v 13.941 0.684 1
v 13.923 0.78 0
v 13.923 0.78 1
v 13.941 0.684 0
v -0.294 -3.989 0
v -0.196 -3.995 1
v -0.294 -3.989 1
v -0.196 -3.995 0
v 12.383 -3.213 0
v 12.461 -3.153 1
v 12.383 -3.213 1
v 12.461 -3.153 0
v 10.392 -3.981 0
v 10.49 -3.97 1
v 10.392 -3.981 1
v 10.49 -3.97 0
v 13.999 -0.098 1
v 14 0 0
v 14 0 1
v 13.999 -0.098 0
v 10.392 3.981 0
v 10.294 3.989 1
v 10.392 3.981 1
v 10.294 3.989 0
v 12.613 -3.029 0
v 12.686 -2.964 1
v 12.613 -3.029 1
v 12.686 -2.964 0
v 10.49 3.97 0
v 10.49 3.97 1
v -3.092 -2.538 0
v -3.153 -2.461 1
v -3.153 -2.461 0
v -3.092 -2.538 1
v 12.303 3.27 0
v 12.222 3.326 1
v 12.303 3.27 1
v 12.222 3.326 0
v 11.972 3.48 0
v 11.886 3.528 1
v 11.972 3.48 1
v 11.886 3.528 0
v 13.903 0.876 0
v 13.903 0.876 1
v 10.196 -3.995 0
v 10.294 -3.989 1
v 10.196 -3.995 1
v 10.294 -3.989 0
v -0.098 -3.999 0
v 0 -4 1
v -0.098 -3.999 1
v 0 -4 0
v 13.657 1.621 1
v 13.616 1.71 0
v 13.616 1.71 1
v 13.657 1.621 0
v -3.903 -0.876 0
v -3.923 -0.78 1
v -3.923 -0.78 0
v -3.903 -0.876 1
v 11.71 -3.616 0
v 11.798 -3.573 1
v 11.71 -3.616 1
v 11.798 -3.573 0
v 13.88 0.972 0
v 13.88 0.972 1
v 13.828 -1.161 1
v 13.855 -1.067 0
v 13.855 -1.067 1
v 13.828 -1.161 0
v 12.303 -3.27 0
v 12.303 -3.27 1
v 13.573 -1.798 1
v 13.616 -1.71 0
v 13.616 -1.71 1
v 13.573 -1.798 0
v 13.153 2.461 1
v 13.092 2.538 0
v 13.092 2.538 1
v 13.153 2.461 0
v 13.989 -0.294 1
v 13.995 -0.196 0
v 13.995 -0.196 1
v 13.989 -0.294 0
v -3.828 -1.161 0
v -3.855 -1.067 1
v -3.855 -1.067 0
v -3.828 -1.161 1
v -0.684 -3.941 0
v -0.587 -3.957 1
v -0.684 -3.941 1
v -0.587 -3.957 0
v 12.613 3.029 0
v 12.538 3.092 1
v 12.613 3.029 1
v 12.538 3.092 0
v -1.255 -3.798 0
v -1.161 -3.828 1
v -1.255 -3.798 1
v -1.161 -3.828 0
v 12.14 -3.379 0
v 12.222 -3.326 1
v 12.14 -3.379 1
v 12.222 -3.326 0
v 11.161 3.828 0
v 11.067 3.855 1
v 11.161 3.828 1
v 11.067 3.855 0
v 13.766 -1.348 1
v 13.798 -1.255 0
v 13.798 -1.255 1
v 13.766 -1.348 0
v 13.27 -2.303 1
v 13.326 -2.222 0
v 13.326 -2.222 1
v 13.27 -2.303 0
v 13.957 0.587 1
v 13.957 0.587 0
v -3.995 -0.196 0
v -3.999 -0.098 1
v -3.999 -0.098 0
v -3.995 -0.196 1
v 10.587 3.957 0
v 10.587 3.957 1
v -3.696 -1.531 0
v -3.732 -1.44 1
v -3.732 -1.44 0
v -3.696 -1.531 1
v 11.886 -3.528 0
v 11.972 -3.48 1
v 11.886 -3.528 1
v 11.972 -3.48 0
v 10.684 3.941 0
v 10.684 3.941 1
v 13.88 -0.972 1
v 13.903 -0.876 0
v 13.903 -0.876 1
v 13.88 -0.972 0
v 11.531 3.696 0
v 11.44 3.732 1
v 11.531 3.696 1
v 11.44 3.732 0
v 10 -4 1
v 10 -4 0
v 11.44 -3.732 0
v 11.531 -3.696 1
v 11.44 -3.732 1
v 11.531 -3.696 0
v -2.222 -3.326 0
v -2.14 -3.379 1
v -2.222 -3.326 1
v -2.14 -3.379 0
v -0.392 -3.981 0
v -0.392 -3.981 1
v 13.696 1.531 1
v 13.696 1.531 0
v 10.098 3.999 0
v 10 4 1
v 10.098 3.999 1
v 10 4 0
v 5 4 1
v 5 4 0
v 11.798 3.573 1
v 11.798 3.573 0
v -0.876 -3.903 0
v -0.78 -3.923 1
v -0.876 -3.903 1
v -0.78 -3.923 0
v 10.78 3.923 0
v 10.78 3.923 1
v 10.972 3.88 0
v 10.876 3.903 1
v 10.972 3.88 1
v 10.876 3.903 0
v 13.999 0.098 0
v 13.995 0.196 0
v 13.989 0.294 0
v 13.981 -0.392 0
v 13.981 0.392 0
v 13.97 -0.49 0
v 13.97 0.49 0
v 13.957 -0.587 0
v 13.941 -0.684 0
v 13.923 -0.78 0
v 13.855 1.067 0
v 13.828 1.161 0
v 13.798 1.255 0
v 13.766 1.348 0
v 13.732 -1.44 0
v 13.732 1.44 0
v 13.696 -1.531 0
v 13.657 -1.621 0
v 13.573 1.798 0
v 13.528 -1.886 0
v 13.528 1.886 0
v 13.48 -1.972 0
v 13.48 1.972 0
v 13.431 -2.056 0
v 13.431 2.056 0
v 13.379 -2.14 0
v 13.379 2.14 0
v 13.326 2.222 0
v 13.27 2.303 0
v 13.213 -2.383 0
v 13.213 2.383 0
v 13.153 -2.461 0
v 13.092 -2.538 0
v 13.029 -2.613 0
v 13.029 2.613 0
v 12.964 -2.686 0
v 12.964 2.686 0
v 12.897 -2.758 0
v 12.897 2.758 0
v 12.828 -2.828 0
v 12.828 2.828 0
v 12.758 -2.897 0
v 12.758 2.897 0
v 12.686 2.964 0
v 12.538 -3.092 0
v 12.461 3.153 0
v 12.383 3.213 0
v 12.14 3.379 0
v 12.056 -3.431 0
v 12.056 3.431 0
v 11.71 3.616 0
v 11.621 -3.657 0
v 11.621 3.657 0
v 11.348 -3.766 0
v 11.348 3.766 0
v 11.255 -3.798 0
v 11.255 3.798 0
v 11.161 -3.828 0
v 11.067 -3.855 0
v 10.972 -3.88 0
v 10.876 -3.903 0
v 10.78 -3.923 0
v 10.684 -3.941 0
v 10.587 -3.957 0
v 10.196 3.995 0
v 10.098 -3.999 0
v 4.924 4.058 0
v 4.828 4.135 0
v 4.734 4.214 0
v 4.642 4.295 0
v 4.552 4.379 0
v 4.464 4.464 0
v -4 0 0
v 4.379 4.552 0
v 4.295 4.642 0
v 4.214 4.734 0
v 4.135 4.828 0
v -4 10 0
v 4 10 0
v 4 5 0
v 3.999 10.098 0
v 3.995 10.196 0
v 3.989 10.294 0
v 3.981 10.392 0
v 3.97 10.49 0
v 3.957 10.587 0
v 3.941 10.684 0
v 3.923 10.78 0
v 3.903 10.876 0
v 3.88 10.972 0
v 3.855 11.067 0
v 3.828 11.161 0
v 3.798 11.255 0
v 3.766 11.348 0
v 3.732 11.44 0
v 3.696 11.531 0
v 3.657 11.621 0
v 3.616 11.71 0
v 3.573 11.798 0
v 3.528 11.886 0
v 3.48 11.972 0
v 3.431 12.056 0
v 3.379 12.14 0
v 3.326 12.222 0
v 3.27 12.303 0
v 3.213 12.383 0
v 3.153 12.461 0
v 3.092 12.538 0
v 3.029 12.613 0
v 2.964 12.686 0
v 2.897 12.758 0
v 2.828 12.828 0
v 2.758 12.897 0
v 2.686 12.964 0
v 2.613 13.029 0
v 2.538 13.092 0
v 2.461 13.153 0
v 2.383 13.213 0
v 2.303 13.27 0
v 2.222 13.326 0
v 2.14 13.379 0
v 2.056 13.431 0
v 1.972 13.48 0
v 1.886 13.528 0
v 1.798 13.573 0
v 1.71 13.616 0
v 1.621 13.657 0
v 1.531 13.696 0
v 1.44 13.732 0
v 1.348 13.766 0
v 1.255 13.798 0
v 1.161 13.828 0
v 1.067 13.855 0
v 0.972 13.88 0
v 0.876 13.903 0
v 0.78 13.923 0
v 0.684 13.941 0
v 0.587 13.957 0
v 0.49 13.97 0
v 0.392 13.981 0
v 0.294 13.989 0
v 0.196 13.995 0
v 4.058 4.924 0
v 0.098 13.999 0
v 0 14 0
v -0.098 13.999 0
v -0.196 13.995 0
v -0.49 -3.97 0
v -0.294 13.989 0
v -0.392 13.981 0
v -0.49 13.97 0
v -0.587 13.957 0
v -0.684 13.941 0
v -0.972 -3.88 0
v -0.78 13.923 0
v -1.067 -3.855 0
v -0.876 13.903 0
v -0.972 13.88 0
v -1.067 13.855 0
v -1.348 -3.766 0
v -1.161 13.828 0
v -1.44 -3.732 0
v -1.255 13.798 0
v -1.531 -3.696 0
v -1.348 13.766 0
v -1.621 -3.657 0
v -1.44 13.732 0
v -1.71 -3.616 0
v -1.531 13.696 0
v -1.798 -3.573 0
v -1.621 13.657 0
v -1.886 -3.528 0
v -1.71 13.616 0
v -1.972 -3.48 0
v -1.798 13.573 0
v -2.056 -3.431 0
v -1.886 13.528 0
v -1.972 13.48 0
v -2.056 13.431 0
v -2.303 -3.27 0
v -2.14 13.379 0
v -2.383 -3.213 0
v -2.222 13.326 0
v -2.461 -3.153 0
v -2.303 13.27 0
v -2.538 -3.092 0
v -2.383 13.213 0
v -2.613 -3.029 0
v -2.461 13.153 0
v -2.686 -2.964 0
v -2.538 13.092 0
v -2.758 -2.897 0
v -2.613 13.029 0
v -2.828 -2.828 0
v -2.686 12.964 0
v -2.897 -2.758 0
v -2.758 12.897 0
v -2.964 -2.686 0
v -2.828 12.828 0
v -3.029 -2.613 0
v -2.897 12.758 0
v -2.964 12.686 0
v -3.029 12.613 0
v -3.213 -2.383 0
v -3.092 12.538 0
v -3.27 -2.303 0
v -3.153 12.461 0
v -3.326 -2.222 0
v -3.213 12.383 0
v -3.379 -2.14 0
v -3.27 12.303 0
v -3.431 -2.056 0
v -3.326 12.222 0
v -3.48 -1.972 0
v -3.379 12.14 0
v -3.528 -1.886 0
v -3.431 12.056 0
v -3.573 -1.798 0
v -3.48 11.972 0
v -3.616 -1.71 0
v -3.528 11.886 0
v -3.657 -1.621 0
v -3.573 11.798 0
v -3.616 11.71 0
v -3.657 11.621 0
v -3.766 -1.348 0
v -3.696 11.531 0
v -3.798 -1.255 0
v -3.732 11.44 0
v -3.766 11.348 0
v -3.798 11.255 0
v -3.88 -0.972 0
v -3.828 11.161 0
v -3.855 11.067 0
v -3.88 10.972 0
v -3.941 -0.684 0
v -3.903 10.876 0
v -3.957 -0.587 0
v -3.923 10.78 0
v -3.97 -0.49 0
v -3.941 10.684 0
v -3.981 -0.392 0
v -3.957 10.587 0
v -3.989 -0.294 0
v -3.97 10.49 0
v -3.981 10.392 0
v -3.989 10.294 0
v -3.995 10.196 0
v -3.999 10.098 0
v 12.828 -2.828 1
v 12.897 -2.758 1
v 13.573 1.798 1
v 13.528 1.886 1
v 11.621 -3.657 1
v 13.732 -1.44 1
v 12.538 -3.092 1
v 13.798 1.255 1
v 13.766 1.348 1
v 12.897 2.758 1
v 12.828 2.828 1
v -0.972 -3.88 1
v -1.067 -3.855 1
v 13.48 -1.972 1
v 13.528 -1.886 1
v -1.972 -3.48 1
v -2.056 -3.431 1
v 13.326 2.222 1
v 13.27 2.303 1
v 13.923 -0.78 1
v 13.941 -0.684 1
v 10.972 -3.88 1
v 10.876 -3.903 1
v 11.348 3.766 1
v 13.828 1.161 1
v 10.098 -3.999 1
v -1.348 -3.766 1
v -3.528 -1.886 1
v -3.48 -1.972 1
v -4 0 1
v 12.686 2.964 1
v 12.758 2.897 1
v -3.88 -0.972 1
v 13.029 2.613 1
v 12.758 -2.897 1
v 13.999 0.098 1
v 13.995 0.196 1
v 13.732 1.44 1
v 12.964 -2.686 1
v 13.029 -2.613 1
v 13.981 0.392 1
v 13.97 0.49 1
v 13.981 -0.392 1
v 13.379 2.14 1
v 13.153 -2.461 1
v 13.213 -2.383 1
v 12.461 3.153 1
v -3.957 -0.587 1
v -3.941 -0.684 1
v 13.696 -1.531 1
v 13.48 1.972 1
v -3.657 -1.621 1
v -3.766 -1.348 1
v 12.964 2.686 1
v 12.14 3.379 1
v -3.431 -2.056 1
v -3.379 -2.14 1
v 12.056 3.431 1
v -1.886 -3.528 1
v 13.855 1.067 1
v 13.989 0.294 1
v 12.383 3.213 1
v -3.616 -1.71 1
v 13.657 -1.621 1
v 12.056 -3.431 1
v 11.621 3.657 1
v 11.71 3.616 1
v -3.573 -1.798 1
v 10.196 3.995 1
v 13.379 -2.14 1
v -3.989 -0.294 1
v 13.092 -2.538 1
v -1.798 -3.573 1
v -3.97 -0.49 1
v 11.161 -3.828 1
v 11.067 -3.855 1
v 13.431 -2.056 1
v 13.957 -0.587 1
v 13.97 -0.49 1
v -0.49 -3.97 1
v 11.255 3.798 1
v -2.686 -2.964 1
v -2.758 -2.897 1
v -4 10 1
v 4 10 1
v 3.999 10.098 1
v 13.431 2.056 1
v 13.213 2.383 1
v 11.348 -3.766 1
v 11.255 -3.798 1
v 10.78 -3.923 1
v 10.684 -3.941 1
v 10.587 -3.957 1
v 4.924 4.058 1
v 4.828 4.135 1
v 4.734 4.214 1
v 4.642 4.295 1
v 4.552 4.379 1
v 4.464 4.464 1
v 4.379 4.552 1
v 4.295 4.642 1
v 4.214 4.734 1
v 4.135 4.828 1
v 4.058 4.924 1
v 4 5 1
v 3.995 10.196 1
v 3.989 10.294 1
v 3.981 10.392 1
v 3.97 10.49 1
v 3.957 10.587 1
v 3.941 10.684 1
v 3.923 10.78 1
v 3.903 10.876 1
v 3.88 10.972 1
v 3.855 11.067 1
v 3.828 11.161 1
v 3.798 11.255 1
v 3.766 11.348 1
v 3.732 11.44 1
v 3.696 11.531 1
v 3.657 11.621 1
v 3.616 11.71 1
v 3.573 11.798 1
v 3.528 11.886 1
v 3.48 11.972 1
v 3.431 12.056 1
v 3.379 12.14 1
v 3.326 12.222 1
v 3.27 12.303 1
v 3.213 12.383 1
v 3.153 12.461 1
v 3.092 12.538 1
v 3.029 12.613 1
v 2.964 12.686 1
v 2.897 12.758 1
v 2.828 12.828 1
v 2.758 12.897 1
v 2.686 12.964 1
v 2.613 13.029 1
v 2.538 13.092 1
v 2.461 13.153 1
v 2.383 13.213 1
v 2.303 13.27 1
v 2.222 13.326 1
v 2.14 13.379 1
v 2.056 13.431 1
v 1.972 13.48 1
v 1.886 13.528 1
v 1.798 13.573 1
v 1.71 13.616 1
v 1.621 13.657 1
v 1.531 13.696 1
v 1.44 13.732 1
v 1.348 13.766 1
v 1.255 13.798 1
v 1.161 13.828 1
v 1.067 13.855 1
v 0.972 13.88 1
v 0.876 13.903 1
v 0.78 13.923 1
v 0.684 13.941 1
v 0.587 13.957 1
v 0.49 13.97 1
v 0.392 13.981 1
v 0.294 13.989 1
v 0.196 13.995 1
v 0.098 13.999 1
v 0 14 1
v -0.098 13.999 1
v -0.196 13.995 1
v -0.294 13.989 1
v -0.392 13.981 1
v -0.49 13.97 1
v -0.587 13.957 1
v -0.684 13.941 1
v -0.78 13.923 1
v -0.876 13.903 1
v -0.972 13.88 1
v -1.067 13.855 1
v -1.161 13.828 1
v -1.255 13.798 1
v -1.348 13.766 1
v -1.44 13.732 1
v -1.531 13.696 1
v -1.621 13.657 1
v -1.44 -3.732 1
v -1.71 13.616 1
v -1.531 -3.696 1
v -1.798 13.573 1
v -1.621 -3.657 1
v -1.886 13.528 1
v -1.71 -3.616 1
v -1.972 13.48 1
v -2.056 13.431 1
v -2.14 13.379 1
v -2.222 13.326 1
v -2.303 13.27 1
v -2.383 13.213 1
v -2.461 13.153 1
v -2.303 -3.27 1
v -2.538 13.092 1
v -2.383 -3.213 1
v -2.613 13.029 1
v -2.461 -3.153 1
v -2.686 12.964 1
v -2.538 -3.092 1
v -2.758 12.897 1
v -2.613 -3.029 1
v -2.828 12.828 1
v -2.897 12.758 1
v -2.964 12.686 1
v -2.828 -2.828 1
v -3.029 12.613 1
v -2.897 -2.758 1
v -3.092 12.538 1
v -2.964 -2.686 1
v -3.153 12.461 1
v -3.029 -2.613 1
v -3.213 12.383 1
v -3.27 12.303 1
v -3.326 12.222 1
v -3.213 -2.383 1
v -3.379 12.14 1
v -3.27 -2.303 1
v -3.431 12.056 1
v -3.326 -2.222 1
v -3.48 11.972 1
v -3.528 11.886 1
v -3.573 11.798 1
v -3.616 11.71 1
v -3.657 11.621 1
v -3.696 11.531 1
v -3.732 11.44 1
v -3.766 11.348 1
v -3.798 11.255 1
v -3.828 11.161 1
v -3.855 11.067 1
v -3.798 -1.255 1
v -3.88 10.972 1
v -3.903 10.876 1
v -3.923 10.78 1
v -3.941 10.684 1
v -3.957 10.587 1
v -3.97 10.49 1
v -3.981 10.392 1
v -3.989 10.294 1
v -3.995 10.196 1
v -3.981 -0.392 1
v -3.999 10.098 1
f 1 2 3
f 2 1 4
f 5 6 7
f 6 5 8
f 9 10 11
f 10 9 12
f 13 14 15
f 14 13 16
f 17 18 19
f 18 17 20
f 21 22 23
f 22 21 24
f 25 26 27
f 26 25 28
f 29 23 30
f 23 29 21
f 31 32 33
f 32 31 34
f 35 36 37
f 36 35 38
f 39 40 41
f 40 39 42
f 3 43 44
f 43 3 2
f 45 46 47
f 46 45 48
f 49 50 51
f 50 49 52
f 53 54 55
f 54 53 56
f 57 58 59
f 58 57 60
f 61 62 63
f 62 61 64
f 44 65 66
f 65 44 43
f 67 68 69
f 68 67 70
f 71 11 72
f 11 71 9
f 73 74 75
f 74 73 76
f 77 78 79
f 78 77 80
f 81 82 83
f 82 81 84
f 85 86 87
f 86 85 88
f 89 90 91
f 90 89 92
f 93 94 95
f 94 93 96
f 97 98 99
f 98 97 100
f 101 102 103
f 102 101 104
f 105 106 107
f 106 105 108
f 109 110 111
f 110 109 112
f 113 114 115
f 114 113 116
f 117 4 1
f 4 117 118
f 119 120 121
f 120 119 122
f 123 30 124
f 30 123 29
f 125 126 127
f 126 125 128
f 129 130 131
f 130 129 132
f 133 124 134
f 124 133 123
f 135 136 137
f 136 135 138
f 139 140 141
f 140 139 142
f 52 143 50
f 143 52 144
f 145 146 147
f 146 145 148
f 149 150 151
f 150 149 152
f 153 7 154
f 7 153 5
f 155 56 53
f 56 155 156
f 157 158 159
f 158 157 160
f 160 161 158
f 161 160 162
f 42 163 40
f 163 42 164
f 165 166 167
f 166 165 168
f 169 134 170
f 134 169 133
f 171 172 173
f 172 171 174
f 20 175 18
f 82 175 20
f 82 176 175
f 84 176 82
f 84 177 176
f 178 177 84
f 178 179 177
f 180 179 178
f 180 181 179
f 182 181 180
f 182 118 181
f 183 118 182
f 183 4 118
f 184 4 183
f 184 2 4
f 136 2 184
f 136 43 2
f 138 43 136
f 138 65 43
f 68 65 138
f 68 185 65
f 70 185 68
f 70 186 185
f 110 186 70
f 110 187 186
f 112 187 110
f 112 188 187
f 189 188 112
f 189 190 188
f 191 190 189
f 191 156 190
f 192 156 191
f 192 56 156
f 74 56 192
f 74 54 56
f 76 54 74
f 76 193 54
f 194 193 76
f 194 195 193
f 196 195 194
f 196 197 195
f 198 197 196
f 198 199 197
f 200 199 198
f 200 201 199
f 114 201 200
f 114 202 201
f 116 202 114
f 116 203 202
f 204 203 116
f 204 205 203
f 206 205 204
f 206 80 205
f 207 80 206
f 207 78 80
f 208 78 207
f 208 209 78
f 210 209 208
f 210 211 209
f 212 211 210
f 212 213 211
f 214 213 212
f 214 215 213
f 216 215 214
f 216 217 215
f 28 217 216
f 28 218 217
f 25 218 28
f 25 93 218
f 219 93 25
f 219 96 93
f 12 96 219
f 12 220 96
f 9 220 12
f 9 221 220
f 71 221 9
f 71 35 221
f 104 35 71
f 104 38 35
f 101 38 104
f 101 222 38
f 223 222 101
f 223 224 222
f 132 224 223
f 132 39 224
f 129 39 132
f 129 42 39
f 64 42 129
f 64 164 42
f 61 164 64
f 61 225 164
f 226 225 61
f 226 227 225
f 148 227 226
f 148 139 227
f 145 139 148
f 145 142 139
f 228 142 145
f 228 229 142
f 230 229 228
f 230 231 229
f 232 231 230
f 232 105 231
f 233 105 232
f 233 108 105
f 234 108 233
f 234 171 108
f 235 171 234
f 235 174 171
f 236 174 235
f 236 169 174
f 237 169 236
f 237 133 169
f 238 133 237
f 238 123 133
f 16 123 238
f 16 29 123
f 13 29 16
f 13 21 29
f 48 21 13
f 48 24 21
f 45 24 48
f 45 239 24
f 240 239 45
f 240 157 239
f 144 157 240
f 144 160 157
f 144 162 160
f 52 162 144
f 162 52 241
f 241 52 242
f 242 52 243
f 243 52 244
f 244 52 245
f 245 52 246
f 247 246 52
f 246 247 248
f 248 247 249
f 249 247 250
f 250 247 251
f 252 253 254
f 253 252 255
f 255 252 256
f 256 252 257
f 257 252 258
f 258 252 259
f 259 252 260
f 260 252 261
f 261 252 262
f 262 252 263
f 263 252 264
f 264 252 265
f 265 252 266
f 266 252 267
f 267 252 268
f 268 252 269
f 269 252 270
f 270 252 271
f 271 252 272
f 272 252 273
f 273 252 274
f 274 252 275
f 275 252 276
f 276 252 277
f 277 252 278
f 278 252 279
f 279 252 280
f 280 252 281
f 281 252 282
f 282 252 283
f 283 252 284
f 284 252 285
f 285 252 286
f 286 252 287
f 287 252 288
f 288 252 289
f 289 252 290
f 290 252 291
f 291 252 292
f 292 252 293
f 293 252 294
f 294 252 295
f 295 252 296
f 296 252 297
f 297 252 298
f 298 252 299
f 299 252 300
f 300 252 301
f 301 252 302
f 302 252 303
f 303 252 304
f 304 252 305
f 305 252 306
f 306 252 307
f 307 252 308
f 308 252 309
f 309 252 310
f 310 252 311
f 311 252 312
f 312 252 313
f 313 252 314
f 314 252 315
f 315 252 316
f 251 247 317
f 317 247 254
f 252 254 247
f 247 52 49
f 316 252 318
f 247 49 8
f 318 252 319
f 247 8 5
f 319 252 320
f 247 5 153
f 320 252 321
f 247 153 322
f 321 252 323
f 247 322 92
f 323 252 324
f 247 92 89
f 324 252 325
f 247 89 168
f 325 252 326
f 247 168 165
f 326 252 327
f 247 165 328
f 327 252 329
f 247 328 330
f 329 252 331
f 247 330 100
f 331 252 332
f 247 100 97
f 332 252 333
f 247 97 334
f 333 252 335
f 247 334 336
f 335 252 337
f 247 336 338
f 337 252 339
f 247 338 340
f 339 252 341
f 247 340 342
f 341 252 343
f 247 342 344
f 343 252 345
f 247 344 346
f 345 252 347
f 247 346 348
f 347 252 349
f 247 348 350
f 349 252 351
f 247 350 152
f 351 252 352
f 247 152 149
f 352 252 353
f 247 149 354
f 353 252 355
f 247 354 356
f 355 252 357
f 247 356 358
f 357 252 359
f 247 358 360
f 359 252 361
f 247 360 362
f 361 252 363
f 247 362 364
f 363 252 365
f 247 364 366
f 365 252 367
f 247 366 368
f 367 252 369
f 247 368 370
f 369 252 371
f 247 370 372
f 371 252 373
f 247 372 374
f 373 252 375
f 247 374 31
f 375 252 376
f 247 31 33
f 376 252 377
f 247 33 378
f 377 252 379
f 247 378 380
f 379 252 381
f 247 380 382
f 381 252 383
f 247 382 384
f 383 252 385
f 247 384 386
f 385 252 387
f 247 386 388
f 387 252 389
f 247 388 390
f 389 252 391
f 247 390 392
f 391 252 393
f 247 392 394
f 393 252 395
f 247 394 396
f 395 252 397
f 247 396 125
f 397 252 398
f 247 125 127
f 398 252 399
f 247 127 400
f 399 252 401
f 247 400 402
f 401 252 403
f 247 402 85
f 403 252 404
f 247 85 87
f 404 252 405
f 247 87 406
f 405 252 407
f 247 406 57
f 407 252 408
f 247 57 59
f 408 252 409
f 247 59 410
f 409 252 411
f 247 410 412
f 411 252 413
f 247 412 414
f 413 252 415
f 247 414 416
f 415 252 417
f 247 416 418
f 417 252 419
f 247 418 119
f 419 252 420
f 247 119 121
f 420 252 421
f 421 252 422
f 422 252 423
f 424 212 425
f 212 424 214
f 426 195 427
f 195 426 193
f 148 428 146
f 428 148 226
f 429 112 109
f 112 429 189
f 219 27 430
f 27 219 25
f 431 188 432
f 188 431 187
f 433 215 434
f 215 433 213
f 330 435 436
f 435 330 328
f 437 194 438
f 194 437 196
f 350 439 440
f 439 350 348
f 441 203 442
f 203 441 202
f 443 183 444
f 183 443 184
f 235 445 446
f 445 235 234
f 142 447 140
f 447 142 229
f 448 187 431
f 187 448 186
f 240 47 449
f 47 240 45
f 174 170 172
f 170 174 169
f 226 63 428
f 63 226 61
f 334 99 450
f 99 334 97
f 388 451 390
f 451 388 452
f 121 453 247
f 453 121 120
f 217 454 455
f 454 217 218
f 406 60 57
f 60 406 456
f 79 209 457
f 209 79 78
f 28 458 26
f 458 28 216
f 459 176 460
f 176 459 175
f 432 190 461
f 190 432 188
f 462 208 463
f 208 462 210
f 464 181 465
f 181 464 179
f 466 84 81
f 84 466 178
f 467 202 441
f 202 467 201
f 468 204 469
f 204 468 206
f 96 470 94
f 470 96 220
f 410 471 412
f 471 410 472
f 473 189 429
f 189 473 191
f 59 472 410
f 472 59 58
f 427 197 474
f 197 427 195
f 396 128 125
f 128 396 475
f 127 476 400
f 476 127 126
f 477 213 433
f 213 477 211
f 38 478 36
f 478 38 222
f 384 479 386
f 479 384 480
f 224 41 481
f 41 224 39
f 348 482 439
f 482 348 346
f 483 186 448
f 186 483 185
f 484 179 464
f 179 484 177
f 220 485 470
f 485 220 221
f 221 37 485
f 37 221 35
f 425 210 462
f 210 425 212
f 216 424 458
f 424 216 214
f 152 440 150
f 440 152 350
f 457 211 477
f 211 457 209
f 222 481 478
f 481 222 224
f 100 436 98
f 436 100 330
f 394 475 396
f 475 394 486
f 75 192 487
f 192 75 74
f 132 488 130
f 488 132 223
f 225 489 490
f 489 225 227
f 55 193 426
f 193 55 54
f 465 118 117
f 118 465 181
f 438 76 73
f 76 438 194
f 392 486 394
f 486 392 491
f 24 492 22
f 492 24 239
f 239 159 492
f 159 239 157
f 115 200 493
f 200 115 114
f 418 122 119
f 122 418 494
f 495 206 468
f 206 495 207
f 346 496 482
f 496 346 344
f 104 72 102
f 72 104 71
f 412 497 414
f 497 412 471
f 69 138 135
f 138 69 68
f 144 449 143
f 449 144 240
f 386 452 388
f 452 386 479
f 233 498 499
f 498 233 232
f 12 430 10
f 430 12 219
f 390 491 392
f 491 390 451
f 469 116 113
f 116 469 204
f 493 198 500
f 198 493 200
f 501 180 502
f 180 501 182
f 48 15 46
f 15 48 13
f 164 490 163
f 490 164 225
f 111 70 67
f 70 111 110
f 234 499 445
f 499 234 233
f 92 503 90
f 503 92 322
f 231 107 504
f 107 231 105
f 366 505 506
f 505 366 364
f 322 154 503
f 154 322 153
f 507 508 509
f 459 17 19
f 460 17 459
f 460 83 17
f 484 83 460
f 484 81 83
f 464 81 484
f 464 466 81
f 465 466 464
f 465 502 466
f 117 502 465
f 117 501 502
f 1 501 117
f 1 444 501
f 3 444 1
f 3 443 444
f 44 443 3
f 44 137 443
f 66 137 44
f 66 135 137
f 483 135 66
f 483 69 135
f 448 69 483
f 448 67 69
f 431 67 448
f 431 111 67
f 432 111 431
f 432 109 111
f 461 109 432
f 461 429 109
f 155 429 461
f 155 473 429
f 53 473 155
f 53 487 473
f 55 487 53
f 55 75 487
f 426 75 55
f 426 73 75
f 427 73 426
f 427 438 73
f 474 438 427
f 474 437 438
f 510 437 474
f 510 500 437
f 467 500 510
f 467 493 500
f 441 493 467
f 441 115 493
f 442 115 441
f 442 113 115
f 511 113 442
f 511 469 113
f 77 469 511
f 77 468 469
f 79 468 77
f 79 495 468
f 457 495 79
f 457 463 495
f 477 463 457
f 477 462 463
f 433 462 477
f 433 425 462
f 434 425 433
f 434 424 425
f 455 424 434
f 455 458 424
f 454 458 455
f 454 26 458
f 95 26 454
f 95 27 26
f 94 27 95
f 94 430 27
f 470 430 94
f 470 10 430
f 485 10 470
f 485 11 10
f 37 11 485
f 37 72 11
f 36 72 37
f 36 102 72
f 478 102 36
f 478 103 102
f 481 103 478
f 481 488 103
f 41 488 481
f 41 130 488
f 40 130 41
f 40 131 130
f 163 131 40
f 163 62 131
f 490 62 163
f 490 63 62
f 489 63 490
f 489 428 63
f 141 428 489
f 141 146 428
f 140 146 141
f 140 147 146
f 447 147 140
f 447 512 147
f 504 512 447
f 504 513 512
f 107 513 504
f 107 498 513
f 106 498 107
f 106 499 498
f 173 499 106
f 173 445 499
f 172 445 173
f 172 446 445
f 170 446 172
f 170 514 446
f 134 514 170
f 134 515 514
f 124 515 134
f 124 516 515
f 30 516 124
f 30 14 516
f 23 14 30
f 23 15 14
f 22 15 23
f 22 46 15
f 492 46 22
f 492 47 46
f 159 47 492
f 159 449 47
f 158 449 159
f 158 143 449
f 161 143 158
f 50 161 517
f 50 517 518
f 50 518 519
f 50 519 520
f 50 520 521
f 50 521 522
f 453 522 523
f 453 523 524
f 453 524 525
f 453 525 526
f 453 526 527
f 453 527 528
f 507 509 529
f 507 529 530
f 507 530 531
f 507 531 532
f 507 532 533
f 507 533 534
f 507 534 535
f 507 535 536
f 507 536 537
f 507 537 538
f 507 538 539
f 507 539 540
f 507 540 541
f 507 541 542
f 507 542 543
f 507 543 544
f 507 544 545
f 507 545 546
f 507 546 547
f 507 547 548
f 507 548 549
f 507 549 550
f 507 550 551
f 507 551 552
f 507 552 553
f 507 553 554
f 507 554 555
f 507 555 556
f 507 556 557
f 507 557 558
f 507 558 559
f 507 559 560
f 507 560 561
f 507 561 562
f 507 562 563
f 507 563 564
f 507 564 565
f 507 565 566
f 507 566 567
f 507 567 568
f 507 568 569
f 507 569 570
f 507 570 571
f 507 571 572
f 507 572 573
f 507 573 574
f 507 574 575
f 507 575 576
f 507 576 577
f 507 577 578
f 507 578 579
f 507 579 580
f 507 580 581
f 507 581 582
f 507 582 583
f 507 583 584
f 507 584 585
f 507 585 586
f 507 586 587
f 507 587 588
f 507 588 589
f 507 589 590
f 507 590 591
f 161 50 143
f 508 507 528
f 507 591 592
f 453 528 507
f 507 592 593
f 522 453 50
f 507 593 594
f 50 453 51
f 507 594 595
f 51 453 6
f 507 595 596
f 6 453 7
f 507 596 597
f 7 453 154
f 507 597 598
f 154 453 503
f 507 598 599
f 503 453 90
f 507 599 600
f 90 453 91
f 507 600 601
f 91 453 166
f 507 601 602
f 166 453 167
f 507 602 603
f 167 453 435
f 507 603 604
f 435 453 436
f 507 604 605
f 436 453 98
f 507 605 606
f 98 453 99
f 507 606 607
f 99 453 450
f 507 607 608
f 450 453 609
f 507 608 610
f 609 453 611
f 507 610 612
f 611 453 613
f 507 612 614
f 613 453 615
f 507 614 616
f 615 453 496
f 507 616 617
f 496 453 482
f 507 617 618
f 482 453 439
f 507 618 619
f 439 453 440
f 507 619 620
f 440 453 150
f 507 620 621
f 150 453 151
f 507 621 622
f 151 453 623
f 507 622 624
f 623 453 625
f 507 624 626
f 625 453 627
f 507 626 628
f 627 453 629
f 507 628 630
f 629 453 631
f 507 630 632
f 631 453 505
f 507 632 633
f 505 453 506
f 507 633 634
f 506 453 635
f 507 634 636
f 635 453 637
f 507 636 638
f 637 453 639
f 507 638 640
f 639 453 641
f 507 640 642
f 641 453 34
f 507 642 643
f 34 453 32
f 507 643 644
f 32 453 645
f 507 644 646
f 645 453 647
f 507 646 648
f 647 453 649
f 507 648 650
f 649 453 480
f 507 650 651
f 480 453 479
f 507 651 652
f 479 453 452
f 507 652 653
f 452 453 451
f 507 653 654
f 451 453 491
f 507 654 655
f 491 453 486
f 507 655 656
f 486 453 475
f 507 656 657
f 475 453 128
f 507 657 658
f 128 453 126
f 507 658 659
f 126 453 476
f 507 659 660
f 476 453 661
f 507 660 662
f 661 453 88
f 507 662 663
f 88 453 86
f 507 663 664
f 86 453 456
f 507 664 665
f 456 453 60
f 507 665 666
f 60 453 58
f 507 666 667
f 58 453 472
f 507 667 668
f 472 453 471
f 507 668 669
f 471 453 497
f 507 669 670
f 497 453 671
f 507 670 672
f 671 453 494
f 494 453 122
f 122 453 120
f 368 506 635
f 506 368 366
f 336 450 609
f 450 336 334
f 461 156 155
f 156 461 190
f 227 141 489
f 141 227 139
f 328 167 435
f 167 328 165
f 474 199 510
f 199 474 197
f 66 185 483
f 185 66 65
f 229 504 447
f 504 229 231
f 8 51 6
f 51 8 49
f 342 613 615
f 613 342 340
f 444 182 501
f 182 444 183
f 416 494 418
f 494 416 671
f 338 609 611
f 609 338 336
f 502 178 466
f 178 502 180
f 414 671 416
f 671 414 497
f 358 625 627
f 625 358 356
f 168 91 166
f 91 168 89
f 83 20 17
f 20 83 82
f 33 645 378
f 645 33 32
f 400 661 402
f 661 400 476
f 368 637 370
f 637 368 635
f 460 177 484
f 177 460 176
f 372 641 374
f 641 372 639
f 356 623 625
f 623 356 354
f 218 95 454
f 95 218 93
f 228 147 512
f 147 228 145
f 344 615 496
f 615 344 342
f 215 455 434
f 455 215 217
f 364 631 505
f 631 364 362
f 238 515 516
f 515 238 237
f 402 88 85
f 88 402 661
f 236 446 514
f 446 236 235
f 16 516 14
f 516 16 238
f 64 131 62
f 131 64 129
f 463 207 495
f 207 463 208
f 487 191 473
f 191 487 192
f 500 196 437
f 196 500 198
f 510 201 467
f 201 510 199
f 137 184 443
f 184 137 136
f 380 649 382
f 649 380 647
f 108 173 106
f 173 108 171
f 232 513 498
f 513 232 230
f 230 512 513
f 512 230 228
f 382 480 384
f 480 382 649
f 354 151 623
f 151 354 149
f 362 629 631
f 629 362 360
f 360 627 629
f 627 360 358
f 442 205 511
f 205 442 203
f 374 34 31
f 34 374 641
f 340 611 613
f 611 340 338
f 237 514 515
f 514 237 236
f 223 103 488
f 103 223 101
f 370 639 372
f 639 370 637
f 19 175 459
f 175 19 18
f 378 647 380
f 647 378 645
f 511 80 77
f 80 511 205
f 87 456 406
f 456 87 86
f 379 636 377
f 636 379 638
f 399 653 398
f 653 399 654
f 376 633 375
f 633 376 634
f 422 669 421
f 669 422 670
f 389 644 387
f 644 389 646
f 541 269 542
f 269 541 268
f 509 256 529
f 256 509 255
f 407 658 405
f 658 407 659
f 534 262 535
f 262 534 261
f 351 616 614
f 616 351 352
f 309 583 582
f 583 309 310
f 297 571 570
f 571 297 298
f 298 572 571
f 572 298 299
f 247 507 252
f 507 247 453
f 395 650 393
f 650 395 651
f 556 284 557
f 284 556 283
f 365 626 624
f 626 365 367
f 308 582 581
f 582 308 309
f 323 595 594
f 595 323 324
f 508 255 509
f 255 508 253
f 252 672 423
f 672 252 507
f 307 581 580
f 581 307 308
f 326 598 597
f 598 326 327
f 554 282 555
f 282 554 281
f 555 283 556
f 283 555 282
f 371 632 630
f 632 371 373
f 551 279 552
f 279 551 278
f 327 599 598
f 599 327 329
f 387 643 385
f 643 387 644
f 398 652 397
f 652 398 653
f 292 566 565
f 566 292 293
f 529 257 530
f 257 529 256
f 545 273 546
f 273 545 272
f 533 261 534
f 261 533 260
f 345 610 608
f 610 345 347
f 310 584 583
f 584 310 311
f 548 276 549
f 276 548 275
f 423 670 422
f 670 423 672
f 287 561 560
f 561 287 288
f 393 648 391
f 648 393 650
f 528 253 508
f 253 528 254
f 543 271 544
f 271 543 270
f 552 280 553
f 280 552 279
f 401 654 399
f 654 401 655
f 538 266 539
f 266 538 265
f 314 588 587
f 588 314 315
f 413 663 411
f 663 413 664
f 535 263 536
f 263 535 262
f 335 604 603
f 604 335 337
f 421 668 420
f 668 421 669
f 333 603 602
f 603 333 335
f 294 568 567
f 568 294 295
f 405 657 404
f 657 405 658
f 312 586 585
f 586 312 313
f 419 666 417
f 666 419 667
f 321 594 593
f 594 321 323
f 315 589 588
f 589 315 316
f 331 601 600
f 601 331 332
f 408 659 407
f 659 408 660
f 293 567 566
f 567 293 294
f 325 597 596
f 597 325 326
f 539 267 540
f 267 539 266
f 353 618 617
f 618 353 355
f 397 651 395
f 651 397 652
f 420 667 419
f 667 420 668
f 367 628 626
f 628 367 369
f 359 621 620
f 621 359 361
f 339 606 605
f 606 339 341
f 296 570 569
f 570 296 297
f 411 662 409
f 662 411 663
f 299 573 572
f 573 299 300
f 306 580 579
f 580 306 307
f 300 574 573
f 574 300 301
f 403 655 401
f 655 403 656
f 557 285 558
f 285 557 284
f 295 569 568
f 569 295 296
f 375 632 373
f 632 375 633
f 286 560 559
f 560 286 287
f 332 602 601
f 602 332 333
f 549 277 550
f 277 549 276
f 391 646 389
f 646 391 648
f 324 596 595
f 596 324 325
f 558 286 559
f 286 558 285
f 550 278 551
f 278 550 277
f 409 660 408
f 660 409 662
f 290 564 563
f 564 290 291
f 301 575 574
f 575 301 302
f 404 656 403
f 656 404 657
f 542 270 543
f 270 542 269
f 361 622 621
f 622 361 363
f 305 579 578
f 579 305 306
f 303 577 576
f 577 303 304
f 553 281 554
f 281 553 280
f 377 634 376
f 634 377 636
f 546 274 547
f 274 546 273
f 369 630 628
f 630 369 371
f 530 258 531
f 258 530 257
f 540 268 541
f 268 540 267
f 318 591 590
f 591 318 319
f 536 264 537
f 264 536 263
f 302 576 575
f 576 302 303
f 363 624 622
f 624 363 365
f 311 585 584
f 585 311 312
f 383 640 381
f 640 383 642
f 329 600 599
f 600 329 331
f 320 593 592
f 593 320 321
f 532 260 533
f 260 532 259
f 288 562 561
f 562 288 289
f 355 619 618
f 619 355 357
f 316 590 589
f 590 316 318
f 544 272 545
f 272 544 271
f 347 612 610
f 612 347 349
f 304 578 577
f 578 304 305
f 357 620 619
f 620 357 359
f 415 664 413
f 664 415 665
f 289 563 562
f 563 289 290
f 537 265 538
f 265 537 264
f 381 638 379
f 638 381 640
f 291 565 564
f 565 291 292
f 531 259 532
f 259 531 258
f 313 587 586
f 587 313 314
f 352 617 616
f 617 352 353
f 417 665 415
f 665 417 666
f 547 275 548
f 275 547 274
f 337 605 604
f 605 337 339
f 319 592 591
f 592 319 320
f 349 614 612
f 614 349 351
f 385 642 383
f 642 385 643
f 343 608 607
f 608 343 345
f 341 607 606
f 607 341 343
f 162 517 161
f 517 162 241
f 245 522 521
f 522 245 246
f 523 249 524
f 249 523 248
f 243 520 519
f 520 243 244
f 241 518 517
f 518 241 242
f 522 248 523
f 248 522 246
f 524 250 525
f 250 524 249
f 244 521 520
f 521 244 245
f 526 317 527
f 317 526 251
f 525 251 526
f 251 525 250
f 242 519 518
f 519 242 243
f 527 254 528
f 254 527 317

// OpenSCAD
/*
	hollowCylinder() v1.0.0 by robert@cosmicrealms.com from https://github.com/Sembiance/openscad-modules
	Allows you to create a hollow cylinder
	
	Usage
	=====
	Prototype: hollowCylinder(d, h, wallWidth, $fn)
	Arguments:
		-         d = Diamater of the cylinder. Default: 5
		-         h = Height of the cylinder. Default: 10
		- wallWidth = How wide the walls should be. Default: 1
		-       $fn = How smooth you want the cylinder rounding to be. Default: 128
	Change Log
	==========
	2017-01-04: v1.0.0 - Initial Release
*/

// Example code:
/*
hollowCylinder(d=10, h=20);
translate([15, 0, 0]) { hollowCylinder(d=15, h=5, wallWidth=0.1); }
translate([30, 0, 0]) { hollowCylinder(d=10, h=2, wallWidth=4.5); }
*/

module hollowCylinder(d=5, h=10, wallWidth=1, $fn=128)
{
	difference()
	{
		cylinder(d=d, h=h);
		translate([0, 0, -0.1]) { cylinder(d=d-(wallWidth*2), h=h+0.2); }
	}
}

union(){
union(){
hull(){
    hollowCylinder(8,1,0.1,256);
    translate([10,0,0]){
        hollowCylinder(8,1,0.1,256);
    }
}

hull(){
    hollowCylinder(8,1,0.1,256);
    translate([0,10,0]){
        hollowCylinder(8,1,0.1,256);
    }
}
}

translate([-8,-8,0]){
difference(){
    translate([8,8,0]){
    cube([8,8,1]);
}
translate([16,16,0]){
    cylinder(d=10, h=1, $fn=256);
}
}
}
}
